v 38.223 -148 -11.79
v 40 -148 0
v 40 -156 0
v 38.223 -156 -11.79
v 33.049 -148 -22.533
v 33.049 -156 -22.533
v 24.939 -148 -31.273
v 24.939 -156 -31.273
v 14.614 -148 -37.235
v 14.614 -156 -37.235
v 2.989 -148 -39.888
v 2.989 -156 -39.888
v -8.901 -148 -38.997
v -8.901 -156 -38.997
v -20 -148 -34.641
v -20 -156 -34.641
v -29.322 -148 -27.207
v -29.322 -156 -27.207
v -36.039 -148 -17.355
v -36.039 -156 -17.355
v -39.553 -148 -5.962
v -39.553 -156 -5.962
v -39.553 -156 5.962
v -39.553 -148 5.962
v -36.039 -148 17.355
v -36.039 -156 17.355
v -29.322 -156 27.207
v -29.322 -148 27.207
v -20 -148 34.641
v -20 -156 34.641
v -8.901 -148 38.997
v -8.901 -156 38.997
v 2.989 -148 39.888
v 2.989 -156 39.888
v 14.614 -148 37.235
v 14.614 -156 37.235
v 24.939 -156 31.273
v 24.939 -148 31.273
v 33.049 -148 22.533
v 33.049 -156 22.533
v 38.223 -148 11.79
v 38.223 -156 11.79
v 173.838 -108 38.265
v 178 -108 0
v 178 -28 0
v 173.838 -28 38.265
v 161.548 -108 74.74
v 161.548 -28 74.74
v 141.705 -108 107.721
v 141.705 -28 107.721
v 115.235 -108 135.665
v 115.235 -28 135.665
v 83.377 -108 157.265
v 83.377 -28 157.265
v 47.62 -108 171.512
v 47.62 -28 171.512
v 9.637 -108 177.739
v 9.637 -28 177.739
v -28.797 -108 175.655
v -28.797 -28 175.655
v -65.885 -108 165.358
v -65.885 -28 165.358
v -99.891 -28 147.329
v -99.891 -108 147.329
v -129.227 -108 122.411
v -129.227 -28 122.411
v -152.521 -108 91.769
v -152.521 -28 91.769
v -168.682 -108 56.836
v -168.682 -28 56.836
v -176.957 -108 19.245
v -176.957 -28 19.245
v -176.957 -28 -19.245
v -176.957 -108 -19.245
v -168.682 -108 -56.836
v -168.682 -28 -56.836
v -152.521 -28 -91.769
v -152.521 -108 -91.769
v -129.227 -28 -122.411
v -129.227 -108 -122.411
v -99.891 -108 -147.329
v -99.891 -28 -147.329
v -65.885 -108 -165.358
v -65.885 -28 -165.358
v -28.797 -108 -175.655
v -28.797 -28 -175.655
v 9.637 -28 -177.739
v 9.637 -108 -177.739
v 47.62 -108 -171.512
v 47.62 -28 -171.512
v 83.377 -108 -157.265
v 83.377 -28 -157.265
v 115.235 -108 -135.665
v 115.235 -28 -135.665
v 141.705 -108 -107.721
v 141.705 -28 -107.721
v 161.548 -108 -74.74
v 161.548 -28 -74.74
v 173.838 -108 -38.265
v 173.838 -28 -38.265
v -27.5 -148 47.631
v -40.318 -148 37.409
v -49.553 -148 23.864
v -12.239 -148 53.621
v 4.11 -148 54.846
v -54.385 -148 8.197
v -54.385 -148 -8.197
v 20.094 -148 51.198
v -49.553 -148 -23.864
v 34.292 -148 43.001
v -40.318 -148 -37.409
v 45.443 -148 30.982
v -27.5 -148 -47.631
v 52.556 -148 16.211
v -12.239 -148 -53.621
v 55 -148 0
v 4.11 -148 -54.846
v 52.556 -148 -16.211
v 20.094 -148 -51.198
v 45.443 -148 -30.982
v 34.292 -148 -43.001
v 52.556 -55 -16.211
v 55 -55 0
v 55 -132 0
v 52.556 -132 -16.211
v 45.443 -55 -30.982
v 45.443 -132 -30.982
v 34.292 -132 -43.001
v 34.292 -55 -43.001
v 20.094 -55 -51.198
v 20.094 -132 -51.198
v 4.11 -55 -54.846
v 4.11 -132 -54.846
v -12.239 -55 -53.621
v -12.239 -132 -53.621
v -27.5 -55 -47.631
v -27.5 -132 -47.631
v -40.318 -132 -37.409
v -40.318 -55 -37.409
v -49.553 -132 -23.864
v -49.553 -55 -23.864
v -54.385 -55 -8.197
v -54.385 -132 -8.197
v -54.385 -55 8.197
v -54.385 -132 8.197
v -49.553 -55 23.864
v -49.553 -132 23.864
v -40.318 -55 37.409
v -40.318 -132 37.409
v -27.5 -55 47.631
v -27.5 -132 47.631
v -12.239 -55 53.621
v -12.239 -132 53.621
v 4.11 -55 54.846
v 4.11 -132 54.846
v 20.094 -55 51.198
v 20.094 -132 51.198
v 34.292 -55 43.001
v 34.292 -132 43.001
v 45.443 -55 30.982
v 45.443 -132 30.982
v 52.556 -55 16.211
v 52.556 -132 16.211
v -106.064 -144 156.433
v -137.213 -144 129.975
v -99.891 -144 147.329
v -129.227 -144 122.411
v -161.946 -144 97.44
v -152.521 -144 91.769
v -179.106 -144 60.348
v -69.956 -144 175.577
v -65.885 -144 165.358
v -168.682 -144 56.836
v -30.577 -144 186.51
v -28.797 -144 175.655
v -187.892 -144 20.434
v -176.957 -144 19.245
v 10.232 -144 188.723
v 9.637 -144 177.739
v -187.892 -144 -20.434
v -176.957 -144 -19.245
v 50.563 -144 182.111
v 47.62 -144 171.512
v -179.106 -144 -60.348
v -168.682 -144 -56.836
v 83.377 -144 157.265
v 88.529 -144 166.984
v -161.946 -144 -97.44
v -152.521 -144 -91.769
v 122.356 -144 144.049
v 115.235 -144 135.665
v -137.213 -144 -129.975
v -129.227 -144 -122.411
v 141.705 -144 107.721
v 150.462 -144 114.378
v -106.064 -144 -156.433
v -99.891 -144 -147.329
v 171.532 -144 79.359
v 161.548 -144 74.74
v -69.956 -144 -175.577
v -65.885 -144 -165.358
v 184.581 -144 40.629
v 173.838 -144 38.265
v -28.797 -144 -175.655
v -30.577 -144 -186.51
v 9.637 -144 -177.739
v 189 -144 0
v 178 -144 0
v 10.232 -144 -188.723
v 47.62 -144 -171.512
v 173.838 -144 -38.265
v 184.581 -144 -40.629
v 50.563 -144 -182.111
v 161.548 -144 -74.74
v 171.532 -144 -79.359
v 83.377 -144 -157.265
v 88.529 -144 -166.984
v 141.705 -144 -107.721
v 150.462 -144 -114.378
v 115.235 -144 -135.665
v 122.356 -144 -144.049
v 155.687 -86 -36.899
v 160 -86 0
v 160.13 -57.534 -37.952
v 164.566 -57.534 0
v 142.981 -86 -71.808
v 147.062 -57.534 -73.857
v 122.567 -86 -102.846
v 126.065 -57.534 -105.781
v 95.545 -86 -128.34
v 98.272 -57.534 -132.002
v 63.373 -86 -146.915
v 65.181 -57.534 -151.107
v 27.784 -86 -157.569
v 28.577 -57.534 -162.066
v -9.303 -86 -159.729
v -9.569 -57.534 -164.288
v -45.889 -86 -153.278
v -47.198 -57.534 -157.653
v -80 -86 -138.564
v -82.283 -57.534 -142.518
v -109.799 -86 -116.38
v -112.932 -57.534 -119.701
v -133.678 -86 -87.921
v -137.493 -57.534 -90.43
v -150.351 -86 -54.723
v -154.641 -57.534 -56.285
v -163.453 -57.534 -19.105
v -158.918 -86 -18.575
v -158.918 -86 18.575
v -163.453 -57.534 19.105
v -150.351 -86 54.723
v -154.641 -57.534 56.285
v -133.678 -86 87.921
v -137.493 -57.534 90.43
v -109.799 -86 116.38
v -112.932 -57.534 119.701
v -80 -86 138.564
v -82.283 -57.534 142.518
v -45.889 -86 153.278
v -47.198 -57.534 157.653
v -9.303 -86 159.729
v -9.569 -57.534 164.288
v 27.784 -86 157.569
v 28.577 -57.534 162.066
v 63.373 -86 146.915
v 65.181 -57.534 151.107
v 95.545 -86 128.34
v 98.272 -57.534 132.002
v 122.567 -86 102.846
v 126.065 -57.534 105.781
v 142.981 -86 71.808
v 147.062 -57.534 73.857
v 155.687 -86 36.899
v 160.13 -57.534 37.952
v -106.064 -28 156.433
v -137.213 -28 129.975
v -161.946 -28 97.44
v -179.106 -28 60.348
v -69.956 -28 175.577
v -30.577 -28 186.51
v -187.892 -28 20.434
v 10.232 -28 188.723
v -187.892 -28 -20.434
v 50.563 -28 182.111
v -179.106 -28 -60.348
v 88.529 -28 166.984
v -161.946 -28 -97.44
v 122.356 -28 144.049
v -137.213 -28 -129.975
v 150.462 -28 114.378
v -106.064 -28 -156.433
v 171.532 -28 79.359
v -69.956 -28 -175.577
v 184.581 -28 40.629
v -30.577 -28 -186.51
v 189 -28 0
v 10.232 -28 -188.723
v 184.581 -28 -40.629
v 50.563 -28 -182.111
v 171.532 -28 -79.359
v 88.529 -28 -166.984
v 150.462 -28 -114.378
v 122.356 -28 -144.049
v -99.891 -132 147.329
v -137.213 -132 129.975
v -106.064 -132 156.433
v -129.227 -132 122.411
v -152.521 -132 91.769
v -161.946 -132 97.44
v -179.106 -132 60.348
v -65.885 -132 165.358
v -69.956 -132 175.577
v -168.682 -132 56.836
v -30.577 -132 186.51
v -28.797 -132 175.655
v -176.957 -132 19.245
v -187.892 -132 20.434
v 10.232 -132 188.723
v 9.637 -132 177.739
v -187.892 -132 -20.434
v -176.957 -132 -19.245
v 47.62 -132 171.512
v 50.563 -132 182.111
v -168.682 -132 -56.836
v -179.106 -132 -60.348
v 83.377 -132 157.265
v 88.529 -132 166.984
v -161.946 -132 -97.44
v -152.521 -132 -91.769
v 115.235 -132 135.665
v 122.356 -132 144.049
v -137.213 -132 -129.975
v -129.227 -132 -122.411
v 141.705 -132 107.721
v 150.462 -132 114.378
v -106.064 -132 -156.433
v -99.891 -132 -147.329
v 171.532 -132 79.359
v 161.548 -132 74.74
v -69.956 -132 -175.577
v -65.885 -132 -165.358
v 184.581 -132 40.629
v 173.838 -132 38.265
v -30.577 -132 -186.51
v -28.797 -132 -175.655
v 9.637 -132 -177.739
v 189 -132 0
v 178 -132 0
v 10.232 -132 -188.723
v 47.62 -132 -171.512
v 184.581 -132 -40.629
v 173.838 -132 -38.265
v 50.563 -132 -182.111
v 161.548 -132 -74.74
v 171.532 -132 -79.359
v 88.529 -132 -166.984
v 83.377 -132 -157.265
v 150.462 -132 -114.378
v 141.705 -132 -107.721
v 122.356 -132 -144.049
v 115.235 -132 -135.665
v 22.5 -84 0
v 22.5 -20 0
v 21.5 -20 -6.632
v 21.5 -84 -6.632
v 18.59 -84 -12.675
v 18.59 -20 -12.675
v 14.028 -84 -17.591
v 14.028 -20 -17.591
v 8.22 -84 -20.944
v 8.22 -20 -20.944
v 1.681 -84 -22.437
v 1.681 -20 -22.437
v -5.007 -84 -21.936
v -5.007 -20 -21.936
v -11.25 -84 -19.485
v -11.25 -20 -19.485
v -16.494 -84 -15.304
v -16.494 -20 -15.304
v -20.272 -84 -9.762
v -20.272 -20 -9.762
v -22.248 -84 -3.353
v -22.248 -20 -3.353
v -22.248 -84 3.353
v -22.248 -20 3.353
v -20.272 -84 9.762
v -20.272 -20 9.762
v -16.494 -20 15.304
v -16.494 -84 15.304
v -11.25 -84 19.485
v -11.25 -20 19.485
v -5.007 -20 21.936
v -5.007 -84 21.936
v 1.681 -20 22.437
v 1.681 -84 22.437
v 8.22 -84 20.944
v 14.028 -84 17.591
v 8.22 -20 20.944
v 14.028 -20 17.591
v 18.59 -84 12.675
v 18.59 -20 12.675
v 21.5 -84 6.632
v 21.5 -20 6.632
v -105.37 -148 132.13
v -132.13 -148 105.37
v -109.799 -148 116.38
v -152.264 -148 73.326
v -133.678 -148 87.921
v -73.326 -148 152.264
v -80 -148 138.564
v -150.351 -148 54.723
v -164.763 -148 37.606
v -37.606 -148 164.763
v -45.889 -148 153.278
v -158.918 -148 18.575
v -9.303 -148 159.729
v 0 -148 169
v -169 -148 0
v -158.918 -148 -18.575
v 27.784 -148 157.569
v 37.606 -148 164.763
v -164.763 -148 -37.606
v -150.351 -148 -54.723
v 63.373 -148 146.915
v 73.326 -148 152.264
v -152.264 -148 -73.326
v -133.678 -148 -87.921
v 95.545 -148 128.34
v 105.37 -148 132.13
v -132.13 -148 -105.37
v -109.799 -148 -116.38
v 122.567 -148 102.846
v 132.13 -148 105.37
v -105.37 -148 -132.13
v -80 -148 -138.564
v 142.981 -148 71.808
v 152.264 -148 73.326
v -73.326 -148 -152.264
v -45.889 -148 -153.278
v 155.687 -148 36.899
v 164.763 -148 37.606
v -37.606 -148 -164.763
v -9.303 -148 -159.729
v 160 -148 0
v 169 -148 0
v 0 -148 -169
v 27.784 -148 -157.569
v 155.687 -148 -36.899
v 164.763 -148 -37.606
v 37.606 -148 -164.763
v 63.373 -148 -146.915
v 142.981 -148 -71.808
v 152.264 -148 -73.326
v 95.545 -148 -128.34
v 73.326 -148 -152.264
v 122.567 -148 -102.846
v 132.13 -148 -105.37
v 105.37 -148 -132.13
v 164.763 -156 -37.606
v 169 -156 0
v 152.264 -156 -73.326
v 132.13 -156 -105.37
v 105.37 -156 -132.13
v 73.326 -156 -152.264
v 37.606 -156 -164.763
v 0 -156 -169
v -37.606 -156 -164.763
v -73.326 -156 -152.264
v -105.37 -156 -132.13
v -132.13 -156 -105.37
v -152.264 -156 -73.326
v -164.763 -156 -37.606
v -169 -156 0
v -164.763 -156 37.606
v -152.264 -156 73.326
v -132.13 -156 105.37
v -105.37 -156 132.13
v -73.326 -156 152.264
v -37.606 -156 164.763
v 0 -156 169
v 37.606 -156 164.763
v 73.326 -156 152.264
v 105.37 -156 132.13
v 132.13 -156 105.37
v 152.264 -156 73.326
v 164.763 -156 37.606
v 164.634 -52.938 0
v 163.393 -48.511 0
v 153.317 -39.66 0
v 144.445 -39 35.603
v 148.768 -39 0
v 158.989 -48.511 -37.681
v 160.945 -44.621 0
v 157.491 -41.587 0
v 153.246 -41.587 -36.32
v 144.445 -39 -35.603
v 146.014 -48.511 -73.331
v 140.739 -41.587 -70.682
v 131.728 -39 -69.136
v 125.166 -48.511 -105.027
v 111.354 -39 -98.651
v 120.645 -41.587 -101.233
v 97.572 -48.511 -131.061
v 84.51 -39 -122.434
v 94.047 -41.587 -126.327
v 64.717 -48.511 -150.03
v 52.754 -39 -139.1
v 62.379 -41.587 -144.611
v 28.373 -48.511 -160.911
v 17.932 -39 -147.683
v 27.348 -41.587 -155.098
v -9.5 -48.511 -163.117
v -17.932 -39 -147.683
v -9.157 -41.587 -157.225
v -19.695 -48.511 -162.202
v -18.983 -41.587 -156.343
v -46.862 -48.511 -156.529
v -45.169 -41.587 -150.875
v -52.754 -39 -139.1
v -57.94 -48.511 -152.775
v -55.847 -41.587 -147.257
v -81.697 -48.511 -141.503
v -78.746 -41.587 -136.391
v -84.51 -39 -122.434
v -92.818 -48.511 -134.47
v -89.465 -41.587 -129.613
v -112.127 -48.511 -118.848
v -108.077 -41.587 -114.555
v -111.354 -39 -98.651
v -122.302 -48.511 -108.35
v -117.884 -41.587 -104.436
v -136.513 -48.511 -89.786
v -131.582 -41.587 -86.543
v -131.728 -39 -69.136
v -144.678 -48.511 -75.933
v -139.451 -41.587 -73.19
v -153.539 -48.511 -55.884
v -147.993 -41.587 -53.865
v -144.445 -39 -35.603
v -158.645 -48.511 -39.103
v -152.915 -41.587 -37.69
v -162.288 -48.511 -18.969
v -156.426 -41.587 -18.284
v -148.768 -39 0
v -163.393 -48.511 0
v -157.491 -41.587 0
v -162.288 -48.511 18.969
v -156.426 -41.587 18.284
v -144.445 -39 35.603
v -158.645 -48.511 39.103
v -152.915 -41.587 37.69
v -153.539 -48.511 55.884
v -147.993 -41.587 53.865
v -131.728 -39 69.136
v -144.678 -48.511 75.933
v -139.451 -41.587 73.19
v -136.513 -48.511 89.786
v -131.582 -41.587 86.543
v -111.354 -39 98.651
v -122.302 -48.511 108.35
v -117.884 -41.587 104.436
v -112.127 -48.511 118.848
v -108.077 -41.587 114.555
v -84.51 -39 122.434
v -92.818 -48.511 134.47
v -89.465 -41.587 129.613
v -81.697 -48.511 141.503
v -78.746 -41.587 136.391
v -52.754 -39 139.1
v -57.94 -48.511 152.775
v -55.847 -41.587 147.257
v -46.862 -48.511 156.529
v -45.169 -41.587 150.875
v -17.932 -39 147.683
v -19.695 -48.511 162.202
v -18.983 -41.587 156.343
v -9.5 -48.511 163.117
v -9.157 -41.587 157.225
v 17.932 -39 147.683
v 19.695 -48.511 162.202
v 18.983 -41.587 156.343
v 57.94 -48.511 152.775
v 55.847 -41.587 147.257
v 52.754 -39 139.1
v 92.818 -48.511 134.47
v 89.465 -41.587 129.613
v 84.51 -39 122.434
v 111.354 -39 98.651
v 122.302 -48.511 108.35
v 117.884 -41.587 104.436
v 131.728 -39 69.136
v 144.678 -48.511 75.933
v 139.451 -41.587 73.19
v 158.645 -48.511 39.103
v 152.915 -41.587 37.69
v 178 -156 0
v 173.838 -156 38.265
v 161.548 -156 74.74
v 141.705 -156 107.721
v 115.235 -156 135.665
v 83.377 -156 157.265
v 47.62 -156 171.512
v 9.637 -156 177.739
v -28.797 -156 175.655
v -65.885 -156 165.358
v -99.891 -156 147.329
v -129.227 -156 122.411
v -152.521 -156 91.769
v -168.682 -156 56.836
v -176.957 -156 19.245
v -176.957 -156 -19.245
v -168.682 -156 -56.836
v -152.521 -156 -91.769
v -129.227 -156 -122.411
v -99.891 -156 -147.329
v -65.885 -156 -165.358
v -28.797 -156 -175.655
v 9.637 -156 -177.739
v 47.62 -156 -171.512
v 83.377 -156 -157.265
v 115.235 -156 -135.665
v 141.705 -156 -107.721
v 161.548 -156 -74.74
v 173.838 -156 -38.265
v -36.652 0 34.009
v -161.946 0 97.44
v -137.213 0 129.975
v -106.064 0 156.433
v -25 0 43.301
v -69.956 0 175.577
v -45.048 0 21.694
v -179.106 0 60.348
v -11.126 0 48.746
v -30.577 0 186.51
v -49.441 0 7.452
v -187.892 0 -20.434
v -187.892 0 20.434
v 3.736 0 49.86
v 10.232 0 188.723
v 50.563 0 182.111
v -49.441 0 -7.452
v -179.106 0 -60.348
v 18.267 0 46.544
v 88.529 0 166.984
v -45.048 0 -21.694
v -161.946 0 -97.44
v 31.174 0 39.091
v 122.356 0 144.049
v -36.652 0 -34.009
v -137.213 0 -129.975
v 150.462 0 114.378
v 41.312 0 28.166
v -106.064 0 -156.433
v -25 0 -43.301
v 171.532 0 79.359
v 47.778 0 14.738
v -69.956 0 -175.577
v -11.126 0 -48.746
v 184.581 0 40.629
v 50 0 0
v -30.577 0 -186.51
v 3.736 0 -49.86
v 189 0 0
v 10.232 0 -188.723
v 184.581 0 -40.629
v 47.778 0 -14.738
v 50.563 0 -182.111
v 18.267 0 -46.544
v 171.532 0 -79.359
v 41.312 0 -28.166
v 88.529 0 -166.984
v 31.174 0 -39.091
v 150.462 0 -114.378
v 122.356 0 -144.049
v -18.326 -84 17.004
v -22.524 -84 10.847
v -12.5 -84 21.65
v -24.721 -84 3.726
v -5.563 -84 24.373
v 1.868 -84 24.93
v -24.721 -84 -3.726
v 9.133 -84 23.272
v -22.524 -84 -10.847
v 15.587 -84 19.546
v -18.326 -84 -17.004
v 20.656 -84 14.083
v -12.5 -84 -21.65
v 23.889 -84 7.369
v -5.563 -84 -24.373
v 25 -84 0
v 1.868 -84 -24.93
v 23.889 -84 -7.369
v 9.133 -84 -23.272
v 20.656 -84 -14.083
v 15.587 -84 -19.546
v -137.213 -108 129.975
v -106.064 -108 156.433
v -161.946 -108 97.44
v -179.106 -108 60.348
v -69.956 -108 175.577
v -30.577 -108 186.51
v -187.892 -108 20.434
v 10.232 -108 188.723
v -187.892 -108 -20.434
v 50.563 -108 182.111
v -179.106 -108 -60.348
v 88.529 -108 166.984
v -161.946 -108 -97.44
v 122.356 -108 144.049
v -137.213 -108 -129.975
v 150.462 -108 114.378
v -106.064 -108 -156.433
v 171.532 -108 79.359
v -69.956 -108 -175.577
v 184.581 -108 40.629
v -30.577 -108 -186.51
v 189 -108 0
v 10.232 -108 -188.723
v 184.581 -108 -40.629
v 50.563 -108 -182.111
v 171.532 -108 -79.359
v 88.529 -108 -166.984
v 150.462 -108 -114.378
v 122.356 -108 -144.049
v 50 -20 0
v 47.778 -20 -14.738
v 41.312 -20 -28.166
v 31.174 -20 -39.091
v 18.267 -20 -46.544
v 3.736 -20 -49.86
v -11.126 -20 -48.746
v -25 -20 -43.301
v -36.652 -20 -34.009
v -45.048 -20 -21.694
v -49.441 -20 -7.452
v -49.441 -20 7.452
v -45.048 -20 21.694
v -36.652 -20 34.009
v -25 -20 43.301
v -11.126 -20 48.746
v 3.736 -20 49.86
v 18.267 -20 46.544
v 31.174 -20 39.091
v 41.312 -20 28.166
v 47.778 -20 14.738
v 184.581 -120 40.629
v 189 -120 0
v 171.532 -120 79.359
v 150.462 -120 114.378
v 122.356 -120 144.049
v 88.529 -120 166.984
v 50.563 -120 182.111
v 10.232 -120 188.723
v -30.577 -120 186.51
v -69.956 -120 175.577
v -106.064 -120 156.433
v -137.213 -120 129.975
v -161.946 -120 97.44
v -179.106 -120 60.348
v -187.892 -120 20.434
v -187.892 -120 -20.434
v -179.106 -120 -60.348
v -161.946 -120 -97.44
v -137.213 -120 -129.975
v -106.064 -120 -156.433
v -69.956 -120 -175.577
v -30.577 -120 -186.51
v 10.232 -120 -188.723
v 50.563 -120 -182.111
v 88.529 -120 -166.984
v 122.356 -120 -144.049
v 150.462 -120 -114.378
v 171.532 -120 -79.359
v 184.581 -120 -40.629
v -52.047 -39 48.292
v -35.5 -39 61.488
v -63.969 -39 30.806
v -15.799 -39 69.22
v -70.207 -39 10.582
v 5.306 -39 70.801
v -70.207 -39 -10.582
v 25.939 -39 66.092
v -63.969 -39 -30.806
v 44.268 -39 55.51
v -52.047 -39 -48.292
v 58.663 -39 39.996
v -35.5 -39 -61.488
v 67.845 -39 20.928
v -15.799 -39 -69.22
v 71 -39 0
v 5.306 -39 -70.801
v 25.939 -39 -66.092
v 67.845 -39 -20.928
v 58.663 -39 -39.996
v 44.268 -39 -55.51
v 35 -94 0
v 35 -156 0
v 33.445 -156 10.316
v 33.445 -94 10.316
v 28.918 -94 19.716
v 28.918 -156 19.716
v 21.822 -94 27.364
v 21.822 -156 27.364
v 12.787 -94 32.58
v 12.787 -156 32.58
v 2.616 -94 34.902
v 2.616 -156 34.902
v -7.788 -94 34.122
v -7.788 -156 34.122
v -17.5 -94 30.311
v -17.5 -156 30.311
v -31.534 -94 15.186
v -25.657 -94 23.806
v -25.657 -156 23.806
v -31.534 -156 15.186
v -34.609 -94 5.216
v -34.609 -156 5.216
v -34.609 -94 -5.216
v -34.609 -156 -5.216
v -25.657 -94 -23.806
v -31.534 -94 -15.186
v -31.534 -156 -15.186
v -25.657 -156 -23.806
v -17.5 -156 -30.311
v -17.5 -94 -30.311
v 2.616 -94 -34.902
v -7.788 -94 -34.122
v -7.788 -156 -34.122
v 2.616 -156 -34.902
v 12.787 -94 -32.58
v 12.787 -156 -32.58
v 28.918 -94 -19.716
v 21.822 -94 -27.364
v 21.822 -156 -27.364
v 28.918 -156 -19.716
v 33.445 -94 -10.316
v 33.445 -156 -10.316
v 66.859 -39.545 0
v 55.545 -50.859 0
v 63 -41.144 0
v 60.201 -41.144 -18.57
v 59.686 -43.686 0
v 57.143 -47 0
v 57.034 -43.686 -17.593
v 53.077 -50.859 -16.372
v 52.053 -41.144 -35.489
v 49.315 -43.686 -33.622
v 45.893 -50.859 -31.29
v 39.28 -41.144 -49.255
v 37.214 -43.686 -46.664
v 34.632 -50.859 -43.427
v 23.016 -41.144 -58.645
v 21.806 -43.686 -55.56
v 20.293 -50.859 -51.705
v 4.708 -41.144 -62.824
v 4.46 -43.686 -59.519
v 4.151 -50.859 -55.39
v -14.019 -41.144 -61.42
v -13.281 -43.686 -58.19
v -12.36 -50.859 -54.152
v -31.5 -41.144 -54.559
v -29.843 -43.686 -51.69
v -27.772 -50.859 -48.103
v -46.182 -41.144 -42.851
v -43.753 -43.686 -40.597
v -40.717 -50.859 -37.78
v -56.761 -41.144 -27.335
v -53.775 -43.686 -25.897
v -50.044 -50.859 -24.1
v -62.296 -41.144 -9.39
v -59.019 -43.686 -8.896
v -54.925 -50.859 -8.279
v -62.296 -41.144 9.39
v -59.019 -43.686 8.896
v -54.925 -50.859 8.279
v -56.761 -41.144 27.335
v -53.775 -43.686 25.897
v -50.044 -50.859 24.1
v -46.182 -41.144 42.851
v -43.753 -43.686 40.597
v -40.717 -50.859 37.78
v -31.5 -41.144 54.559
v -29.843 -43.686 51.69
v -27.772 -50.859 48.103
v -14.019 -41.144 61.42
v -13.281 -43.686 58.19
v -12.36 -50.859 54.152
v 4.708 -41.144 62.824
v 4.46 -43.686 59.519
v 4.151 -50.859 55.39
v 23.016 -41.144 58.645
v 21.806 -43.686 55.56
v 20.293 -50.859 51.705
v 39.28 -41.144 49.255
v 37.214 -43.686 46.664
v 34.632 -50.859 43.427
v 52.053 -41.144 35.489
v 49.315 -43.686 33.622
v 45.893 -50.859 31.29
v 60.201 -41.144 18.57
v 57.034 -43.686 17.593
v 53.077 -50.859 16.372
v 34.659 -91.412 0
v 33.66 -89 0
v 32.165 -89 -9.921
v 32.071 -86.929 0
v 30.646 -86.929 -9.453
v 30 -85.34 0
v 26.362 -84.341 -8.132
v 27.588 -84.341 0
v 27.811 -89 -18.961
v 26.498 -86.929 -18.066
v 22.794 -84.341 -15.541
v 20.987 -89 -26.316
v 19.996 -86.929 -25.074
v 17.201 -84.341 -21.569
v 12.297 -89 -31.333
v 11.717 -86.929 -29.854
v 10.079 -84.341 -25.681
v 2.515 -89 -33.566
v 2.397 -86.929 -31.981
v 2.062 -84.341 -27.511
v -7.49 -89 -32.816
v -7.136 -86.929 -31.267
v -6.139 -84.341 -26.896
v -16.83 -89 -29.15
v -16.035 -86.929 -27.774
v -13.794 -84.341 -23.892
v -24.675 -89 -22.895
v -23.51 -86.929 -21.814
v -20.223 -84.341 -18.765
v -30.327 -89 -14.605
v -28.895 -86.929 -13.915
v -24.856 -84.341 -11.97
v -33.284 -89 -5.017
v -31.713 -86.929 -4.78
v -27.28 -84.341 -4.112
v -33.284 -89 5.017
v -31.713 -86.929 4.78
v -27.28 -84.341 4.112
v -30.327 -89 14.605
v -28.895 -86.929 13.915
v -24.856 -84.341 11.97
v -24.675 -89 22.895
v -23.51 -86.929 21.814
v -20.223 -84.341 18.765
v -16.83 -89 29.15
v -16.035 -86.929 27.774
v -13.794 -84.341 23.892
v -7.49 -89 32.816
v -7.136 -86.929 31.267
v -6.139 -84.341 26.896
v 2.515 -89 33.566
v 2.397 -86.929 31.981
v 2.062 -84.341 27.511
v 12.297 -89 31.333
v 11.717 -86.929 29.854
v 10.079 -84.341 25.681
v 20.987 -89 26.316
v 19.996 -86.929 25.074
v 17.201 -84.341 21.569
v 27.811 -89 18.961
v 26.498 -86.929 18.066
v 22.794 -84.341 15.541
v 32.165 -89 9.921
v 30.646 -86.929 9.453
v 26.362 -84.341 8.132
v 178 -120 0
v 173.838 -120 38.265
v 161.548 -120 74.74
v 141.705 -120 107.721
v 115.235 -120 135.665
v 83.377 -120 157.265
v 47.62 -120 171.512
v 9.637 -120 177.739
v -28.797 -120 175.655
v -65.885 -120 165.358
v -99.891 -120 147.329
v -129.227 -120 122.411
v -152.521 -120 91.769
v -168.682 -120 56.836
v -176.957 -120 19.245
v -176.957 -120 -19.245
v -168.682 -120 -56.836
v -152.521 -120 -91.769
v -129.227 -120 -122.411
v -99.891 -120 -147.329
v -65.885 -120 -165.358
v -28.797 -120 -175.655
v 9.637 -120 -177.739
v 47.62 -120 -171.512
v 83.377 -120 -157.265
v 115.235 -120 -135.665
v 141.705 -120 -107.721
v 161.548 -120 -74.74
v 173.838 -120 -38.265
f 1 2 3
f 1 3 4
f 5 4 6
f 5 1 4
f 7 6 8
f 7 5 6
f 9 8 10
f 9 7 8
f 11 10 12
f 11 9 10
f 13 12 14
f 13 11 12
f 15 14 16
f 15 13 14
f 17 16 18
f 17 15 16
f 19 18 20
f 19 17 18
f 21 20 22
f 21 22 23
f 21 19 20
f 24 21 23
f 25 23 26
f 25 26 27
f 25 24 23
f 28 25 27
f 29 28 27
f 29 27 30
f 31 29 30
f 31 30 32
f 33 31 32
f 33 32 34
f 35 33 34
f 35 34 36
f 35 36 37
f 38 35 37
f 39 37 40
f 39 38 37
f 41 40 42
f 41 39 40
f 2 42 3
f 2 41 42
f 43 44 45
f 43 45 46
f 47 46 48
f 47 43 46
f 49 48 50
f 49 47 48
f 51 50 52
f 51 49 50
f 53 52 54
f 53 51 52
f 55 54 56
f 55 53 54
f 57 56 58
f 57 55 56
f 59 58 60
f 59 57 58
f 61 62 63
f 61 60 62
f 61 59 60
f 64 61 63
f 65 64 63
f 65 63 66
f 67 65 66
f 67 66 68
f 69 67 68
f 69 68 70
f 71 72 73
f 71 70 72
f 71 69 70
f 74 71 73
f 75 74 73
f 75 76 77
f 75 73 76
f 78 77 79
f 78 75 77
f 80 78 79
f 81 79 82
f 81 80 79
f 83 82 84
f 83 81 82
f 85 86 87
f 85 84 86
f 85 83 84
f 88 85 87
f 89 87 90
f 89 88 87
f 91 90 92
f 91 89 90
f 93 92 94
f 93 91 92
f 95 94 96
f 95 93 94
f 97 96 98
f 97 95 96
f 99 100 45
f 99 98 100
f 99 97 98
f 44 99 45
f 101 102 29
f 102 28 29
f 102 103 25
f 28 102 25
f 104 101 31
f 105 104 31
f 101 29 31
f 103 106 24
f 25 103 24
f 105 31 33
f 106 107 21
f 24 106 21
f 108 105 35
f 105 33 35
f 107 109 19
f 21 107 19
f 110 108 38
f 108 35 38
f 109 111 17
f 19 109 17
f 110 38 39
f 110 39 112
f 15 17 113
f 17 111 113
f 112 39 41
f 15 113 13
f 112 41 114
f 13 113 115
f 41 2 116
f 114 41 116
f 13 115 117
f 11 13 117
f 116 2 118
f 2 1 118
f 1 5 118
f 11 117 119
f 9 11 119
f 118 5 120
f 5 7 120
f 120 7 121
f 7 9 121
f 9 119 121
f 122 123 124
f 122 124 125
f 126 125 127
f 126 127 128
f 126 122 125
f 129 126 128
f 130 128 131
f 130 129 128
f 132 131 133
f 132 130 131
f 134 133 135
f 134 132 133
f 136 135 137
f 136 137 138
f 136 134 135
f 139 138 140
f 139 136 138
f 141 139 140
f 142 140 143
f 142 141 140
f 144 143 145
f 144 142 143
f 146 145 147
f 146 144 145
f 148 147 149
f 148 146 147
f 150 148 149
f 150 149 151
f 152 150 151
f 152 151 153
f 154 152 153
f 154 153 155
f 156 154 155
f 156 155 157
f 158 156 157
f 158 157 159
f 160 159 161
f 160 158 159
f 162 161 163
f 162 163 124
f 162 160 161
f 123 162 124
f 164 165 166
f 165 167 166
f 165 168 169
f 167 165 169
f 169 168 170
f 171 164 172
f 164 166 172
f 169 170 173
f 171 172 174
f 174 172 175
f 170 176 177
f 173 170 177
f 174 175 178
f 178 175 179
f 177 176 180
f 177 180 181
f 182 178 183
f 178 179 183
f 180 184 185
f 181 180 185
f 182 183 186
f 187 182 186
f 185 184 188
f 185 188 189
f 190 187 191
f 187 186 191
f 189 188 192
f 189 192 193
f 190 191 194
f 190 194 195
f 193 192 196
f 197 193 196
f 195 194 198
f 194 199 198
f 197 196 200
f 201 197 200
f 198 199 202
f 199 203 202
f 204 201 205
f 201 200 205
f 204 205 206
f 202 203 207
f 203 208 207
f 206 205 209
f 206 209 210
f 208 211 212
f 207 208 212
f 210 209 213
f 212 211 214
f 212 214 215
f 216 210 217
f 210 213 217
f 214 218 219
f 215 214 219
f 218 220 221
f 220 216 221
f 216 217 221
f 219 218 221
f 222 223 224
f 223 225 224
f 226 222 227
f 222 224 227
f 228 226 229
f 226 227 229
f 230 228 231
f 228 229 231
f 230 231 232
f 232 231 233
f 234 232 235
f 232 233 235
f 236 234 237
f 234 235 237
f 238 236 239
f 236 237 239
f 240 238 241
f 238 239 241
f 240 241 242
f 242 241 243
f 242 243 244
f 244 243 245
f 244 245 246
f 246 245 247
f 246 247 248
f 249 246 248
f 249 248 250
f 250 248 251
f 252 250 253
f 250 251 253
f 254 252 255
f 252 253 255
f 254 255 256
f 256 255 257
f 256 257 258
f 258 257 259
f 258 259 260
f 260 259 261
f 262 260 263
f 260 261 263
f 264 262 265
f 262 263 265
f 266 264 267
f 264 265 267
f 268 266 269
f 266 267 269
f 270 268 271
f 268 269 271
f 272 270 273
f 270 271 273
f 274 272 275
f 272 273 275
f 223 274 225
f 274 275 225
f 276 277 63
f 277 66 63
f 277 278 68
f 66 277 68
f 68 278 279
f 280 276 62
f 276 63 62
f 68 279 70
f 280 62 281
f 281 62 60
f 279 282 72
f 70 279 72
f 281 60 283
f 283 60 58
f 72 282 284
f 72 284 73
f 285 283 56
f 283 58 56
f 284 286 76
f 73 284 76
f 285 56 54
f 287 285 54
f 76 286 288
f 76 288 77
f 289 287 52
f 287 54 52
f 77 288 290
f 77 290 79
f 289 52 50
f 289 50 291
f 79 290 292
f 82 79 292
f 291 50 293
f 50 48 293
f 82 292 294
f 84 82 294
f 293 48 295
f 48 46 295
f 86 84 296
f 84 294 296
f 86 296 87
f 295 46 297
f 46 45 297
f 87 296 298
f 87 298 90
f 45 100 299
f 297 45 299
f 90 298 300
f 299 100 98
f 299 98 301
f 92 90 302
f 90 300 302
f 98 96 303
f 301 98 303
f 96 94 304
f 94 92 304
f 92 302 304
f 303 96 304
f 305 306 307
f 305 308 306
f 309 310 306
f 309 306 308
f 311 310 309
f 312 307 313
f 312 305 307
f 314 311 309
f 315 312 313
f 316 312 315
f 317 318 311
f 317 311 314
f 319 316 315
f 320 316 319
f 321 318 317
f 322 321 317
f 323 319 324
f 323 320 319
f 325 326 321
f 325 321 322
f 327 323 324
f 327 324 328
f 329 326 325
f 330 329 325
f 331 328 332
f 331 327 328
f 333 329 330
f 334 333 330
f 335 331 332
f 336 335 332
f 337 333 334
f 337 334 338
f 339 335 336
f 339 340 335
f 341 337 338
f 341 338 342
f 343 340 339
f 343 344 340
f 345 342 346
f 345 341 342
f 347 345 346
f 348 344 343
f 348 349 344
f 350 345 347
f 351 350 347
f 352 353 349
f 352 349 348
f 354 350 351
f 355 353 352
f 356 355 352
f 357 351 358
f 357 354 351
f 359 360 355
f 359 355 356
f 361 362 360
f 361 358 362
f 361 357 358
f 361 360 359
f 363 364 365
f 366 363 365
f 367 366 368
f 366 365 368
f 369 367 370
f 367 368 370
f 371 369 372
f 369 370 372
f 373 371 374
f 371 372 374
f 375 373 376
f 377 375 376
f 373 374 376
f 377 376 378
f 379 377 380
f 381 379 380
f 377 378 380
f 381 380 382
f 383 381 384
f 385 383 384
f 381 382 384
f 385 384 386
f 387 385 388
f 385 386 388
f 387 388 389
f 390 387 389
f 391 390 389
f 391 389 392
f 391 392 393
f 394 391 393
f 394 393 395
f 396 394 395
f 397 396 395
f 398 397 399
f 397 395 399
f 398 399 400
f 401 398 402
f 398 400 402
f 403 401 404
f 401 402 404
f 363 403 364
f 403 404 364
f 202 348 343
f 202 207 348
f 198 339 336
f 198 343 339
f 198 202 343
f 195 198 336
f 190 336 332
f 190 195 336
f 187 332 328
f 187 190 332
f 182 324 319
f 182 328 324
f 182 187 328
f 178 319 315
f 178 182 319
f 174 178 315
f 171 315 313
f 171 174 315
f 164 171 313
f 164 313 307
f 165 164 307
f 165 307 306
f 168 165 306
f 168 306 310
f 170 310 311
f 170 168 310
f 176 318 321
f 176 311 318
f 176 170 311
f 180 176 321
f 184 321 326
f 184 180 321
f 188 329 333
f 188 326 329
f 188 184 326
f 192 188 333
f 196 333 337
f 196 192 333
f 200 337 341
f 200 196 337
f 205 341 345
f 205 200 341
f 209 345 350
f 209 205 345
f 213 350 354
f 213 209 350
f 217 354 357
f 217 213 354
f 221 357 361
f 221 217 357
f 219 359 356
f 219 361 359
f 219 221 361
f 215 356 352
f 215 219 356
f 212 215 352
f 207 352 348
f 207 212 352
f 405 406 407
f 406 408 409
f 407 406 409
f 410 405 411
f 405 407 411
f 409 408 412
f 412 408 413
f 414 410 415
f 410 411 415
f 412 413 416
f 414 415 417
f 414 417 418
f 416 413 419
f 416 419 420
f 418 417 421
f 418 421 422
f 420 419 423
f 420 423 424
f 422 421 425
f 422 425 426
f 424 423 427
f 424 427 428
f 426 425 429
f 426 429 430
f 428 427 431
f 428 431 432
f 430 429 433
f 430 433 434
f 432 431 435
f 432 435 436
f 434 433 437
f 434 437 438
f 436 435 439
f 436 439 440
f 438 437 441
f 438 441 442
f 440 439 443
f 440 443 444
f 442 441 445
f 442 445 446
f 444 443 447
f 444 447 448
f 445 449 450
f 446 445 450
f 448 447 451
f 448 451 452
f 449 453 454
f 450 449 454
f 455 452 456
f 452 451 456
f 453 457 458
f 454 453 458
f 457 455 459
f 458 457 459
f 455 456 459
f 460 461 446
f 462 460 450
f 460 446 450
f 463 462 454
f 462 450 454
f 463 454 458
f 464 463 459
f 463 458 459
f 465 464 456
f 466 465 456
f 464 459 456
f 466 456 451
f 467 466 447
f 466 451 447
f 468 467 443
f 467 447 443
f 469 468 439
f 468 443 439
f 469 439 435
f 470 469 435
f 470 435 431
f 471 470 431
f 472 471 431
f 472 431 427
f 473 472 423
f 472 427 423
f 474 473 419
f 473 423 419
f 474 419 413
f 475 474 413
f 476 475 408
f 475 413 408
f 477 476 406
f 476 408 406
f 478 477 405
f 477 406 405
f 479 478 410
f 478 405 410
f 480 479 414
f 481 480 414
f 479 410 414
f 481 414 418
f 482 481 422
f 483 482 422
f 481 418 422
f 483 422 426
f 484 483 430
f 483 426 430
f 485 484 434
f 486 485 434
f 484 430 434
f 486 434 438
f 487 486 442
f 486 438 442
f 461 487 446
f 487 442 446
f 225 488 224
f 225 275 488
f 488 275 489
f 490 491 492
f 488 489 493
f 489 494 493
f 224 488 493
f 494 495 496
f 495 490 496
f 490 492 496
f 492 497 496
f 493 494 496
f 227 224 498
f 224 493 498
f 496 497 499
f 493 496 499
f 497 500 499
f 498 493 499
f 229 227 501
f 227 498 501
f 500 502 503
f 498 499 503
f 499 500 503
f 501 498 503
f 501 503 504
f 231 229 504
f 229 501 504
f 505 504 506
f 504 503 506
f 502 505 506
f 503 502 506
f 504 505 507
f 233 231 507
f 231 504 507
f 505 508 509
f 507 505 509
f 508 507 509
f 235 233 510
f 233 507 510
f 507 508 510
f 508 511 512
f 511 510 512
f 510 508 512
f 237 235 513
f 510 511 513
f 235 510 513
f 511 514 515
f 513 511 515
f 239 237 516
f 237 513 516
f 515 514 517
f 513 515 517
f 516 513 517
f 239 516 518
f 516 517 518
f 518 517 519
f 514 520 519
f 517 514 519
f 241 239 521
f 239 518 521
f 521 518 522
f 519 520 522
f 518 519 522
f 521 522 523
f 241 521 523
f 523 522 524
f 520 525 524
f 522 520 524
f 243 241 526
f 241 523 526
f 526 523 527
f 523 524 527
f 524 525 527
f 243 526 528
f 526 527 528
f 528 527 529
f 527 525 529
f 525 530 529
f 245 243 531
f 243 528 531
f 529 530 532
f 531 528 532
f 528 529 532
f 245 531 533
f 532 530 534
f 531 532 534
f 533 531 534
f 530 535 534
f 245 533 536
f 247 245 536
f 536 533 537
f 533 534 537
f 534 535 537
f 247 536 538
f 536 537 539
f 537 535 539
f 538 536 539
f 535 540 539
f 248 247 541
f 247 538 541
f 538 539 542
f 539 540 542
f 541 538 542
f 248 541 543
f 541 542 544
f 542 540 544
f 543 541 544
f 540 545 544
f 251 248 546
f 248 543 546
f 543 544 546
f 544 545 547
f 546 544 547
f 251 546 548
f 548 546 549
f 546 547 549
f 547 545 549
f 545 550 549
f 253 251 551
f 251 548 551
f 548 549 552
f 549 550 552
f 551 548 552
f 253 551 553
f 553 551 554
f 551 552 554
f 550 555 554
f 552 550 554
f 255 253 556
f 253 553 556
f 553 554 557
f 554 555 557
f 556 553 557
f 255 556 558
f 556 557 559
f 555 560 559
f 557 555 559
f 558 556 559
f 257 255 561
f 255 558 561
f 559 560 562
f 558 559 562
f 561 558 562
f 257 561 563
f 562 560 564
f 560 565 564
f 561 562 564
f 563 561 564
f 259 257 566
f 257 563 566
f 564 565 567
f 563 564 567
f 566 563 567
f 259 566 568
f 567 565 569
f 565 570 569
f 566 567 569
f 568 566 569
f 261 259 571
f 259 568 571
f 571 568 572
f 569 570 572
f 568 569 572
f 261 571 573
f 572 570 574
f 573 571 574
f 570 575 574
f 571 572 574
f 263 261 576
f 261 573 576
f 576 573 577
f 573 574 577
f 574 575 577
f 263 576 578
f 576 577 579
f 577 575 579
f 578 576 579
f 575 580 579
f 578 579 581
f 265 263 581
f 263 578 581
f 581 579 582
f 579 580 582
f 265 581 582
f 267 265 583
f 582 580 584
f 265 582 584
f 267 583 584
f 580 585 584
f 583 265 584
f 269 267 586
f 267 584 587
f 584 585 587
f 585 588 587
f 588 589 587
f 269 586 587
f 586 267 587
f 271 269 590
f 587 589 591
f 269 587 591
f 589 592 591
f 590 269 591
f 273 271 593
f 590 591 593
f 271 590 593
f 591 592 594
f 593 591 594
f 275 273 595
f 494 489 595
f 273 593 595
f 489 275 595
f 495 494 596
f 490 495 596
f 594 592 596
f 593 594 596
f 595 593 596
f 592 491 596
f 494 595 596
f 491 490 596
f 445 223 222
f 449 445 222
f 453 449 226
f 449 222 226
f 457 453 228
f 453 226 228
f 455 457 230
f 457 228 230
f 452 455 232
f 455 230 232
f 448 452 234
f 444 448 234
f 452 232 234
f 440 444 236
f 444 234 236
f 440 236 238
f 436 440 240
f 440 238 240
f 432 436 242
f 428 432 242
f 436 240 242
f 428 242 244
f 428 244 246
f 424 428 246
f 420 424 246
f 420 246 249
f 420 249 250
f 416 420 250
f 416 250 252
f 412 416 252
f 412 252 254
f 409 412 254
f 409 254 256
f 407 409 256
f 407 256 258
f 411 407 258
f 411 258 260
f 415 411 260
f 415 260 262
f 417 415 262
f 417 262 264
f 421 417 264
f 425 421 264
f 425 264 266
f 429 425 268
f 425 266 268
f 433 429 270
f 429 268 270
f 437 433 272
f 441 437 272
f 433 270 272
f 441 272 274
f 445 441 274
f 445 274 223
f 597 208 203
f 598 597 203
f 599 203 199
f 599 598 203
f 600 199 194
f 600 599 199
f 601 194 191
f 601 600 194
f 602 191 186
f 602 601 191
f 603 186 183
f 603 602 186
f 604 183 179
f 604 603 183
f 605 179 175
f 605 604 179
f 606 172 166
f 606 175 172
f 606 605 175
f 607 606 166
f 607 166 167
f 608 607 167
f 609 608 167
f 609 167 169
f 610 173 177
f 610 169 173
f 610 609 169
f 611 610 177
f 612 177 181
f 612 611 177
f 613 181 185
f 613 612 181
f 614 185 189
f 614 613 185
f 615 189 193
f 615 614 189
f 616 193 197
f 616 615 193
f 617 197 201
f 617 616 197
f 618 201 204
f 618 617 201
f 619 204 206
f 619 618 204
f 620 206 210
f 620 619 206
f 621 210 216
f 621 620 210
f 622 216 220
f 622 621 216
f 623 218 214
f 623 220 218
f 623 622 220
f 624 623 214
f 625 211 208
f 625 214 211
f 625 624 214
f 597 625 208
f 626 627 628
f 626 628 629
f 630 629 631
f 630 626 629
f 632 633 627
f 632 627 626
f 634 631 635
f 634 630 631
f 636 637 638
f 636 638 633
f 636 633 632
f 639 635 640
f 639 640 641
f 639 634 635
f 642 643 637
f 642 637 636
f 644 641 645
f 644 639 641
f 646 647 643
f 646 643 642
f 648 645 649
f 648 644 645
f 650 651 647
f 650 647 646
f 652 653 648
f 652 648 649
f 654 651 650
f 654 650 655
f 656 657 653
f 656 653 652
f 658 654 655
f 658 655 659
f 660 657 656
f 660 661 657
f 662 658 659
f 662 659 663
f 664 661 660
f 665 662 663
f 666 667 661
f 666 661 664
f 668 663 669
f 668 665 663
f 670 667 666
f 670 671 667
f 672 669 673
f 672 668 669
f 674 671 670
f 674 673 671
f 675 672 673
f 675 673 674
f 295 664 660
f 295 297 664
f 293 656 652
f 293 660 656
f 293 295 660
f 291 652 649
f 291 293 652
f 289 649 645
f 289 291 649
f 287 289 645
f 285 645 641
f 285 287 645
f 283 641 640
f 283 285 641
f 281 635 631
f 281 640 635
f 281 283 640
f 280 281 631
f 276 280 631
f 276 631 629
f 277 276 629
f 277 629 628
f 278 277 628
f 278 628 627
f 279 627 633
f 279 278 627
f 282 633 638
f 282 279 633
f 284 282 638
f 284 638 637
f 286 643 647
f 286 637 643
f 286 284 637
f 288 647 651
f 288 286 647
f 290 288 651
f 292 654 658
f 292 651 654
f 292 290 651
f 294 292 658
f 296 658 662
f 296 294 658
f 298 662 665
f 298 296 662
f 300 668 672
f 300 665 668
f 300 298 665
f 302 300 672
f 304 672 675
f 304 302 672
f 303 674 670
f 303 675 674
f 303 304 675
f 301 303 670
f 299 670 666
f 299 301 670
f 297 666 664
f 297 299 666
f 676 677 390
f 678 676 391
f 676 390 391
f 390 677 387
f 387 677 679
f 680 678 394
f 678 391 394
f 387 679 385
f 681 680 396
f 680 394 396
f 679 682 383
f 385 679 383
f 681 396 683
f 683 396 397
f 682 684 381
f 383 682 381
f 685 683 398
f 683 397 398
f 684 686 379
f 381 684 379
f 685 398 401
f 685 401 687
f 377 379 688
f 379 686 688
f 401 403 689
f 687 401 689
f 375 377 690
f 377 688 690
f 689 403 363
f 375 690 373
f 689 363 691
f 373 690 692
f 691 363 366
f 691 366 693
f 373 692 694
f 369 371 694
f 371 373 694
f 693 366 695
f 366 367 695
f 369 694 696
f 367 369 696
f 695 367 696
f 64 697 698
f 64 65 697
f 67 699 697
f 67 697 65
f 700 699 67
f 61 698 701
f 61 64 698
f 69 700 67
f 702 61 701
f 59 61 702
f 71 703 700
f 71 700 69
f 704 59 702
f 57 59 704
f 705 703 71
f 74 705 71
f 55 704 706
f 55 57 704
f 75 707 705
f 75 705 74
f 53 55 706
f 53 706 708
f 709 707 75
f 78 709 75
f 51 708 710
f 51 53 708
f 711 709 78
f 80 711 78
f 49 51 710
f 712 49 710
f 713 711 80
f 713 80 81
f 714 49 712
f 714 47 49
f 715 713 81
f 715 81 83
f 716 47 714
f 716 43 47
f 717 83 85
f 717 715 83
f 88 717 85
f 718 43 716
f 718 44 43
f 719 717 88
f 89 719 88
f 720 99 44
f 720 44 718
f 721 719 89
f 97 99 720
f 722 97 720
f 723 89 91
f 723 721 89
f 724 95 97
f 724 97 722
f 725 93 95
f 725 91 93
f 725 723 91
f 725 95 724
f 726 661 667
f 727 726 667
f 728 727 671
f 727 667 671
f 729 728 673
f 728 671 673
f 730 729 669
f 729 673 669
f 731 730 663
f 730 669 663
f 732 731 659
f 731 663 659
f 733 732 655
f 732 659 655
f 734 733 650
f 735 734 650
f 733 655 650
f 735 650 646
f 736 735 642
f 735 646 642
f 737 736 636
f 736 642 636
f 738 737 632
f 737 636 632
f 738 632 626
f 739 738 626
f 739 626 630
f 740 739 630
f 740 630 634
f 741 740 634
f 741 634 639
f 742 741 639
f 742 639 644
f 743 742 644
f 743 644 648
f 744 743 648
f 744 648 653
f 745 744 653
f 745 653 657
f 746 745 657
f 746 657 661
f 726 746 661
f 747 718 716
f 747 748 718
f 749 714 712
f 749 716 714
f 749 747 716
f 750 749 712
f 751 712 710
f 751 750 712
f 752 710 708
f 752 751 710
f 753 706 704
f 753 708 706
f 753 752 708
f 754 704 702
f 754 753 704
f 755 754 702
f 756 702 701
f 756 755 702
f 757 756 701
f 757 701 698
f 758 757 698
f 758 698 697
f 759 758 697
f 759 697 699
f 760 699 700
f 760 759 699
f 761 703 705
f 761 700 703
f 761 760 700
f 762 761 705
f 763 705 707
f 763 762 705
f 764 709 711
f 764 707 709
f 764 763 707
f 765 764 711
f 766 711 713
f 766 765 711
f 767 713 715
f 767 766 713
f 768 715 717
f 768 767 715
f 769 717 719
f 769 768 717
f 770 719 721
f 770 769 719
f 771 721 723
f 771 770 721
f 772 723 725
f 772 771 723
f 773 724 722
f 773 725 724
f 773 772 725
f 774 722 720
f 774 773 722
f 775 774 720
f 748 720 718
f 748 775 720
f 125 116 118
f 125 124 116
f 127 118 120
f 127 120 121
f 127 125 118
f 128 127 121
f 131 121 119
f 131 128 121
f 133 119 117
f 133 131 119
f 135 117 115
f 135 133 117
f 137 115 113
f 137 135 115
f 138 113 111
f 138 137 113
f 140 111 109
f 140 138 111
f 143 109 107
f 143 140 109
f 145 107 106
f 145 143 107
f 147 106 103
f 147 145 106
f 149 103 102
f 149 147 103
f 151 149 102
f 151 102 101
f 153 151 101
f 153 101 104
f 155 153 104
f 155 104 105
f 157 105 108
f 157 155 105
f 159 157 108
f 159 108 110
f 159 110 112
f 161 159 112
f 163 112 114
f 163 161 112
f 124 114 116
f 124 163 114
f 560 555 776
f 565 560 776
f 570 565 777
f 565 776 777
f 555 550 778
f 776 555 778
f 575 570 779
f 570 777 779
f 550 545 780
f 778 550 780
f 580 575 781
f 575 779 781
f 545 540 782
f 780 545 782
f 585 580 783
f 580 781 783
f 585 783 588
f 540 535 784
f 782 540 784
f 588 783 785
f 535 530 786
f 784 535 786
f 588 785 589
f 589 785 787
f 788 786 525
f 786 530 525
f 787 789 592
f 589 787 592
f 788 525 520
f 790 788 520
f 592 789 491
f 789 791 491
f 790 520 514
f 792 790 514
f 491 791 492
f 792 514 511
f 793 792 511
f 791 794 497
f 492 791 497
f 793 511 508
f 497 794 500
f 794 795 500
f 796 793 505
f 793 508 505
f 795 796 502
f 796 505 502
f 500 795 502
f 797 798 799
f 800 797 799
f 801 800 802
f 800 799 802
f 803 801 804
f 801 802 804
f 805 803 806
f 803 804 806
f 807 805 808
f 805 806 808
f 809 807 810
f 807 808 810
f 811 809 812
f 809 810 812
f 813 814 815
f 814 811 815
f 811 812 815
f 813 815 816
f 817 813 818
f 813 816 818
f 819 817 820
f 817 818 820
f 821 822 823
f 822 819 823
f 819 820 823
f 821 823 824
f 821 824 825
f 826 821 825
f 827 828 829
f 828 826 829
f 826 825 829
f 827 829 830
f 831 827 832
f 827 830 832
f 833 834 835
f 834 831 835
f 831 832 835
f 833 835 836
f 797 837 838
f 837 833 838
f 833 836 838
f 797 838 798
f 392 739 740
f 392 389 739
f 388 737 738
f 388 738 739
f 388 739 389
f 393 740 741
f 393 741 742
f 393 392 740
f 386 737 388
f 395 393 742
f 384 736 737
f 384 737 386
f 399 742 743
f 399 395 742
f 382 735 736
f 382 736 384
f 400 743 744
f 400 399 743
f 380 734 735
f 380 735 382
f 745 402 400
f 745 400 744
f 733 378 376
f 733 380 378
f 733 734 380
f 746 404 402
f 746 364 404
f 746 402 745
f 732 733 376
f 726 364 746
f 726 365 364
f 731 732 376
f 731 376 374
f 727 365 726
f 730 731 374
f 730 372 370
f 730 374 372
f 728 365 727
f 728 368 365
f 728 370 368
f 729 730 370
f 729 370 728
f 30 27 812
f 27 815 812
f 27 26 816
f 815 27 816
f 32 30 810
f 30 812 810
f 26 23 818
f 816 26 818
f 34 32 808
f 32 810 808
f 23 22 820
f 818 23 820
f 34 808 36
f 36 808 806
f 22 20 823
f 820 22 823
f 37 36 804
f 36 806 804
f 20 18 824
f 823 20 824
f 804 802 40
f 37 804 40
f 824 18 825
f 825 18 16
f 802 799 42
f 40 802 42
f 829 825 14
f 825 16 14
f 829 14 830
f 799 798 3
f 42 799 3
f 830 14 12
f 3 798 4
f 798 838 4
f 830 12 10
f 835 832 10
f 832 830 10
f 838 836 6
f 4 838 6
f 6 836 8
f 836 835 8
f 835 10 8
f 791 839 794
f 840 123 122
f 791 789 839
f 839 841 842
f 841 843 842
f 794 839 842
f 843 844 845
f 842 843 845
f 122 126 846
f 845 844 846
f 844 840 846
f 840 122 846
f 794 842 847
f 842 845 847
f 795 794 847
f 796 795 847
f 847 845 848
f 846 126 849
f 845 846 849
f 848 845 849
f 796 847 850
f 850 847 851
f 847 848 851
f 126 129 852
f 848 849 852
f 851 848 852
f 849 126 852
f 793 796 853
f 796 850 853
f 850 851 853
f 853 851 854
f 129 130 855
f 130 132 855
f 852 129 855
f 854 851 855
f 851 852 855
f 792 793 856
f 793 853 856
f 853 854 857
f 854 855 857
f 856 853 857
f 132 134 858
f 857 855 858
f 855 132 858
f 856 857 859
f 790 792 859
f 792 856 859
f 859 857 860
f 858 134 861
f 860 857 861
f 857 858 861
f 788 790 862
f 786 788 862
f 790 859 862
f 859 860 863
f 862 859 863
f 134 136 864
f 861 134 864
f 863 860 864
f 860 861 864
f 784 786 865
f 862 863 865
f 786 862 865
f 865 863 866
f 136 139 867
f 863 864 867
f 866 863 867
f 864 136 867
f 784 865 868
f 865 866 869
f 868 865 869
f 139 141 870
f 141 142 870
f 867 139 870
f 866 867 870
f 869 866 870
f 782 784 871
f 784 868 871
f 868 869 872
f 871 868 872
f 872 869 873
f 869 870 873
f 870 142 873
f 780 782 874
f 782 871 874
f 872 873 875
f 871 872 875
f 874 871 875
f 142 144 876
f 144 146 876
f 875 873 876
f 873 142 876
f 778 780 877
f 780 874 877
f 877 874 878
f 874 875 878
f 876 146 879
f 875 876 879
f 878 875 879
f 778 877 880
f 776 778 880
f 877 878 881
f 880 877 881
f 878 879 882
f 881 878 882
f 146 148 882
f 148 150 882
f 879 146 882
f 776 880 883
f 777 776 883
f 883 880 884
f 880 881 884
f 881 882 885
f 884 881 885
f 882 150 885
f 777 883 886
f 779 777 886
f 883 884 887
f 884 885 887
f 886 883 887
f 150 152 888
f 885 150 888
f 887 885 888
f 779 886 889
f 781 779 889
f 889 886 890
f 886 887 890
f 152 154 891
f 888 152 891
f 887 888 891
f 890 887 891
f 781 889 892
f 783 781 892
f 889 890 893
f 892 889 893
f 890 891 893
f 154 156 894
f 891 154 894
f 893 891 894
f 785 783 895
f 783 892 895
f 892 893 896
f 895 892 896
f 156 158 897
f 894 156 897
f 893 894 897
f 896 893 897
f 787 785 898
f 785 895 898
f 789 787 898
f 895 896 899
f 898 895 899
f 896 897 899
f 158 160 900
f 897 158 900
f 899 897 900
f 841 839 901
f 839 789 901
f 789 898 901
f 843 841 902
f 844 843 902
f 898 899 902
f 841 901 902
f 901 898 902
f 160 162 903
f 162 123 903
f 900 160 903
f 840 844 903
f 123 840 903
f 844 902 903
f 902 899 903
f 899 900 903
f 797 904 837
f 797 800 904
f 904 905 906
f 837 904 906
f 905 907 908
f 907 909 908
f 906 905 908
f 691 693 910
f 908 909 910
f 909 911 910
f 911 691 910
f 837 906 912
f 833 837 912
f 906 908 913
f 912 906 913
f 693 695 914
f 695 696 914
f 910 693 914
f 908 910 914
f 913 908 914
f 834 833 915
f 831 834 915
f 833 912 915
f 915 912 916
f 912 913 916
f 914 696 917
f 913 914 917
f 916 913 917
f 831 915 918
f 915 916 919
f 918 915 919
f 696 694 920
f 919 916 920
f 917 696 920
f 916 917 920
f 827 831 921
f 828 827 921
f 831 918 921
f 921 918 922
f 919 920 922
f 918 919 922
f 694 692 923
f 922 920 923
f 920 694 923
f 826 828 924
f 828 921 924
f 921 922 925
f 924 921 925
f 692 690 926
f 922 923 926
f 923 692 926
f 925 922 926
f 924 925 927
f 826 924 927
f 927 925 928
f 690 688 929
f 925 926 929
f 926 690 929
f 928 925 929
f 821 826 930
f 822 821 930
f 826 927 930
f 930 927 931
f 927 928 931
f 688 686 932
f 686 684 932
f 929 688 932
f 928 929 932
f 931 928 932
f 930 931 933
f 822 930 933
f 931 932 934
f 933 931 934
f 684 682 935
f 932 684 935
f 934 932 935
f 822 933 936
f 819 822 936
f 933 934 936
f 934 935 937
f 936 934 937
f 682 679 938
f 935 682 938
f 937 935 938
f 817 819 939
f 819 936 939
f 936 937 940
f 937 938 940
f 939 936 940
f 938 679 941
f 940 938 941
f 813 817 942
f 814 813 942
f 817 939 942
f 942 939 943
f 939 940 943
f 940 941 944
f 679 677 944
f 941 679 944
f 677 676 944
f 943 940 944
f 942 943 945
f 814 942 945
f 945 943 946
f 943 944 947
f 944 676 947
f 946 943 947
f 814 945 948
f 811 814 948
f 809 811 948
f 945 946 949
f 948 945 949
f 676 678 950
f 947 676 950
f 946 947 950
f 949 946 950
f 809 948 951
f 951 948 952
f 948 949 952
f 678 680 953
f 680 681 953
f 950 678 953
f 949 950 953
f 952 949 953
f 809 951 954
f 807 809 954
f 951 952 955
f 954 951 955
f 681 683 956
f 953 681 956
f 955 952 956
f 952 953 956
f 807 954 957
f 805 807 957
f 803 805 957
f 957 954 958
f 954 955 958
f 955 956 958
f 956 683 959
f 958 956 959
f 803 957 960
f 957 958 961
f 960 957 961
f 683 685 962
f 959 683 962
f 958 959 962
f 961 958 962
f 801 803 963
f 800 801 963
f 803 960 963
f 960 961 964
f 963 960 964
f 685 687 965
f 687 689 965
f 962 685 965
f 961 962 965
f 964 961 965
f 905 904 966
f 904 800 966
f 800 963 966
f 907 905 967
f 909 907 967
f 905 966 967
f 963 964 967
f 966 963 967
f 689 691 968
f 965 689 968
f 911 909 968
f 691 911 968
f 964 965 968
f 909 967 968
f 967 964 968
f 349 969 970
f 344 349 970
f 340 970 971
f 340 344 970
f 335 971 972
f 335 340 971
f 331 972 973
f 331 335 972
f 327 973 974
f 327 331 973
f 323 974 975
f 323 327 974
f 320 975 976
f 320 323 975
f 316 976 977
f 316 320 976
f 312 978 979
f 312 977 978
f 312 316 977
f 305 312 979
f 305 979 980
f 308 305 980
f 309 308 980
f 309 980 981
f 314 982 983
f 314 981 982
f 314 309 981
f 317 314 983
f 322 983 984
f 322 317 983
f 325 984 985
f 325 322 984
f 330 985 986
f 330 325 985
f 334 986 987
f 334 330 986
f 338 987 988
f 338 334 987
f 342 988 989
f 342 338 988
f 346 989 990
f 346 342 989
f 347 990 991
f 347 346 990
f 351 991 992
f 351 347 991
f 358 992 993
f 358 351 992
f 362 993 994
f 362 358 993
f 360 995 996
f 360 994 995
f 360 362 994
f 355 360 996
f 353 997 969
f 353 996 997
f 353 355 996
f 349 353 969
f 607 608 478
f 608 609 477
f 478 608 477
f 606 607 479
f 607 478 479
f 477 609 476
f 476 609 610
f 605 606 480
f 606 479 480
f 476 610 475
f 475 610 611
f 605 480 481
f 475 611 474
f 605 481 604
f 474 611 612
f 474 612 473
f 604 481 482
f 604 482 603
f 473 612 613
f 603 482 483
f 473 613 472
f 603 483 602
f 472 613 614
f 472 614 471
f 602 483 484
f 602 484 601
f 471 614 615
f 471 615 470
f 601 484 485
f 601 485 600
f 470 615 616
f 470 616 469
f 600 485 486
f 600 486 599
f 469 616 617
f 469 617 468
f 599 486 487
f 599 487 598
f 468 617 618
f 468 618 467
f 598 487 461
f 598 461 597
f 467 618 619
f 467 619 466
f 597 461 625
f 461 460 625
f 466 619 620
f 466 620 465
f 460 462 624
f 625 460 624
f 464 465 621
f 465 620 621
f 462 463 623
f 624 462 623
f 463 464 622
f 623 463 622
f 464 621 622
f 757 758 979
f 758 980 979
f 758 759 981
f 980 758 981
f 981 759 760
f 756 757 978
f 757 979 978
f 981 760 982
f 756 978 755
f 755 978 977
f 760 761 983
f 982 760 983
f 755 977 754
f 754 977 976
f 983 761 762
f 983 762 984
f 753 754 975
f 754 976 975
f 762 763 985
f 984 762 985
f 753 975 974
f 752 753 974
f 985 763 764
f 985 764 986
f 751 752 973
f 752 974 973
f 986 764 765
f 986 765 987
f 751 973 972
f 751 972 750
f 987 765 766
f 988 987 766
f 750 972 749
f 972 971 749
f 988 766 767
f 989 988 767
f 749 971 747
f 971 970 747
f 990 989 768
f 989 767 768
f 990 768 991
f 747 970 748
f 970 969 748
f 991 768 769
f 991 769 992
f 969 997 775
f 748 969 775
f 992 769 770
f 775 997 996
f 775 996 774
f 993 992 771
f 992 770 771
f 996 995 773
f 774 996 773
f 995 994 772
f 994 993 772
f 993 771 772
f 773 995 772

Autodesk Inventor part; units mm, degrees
ref_plane "YZ Plane" through (0, 0, 0) normal (1, 0, 0) x (0, 1, 0)
ref_plane "XZ Plane" through (0, 0, 0) normal (0, 1, 0) x (-1, 0, 0)
ref_plane "XY Plane" through (0, 0, 0) normal (0, 0, 1) x (1, 0, 0)
sketch "Эскиз1" plane through (0, 0, 0) normal (0, 0, 1) x (1, 0, 0)
  line L0 (49.9998, 0) -> (189, 0)
  line L1 (148.768, -39) -> (70.9998, -39)
  line L2 (49.9998, -20) -> (49.9998, 0)
  arc A0 (70.9998, -39) -> (54.9998, -55) centre (70.9998, -55) ccw
  arc A1 (34.9998, -94) -> (24.9998, -84) centre (24.9998, -94) ccw
  line L3 (0, 0) -> (0, 25.6698)
  line L4 (54.9998, -132) -> (54.9998, -55)
  line L5 (189, 0) -> (189, -28)
  line L6 (189, -28) -> (178, -28)
  line L7 (178, -28) -> (178, -108)
  line L8 (178, -108) -> (189, -108)
  line L9 (189, -108) -> (189, -120)
  line L10 (189, -120) -> (178, -120)
  line L11 (178, -120) -> (178, -132)
  line L12 (178, -132) -> (189, -132)
  line L13 (189, -132) -> (189, -144)
  line L14 (189, -144) -> (178, -144)
  line L15 (178, -144) -> (178, -156)
  line L16 (24.9998, -84) -> (22.4998, -84)
  line L17 (22.4998, -84) -> (22.4998, -20)
  line L18 (22.4998, -20) -> (49.9998, -20)
  line L19 (34.9998, -94) -> (34.9998, -156)
  line L20 (34.9998, -156) -> (39.9998, -156)
  line L21 (39.9998, -156) -> (39.9998, -148)
  line L22 (39.9998, -148) -> (54.9998, -148)
  line L23 (54.9998, -148) -> (54.9998, -132)
  line L24 (178, -156) -> (169, -156)
  line L25 (169, -156) -> (169, -148)
  line L26 (169, -148) -> (160, -148)
  line L27 (160, -148) -> (160, -86)
  line L28 (160, -86) -> (164.566, -57.5341)
  arc A2 (164.566, -57.5341) -> (148.768, -39) centre (148.768, -55) ccw
  point P0 (154.5118, -39)
  point P1 (54.9998, -39)
  point P2 (34.9998, -84)
  point P3 (137.0508, -39)
  dimension "d0" = 189
  dimension "d5" = 99.512
  dimension "d9" = 16
  dimension "d11" = 10
  dimension "d29" = 20
  dimension "d30" = 28
  dimension "d31" = 11
  dimension "d32" = 80
  dimension "d34" = 12
  dimension "d35" = 11
  dimension "d36" = 12
  dimension "d37" = 11
  dimension "d38" = 12
  dimension "d39" = 11
  dimension "d40" = 12
  dimension "d43" = 2.5
  dimension "d44" = 64
  dimension "d45" = 15
  dimension "d46" = 8
  dimension "d47" = 5
  dimension "d50" = 9
  dimension "d51" = 9
  dimension "d52" = 16
revolve "Вращение1" add sketch "Эскиз1" angle 360 about axis through (0, 0, 0) along (0, 1, 0)
properties part number "Нижняя часть поршня_CPY" material "Чугун, серый"
